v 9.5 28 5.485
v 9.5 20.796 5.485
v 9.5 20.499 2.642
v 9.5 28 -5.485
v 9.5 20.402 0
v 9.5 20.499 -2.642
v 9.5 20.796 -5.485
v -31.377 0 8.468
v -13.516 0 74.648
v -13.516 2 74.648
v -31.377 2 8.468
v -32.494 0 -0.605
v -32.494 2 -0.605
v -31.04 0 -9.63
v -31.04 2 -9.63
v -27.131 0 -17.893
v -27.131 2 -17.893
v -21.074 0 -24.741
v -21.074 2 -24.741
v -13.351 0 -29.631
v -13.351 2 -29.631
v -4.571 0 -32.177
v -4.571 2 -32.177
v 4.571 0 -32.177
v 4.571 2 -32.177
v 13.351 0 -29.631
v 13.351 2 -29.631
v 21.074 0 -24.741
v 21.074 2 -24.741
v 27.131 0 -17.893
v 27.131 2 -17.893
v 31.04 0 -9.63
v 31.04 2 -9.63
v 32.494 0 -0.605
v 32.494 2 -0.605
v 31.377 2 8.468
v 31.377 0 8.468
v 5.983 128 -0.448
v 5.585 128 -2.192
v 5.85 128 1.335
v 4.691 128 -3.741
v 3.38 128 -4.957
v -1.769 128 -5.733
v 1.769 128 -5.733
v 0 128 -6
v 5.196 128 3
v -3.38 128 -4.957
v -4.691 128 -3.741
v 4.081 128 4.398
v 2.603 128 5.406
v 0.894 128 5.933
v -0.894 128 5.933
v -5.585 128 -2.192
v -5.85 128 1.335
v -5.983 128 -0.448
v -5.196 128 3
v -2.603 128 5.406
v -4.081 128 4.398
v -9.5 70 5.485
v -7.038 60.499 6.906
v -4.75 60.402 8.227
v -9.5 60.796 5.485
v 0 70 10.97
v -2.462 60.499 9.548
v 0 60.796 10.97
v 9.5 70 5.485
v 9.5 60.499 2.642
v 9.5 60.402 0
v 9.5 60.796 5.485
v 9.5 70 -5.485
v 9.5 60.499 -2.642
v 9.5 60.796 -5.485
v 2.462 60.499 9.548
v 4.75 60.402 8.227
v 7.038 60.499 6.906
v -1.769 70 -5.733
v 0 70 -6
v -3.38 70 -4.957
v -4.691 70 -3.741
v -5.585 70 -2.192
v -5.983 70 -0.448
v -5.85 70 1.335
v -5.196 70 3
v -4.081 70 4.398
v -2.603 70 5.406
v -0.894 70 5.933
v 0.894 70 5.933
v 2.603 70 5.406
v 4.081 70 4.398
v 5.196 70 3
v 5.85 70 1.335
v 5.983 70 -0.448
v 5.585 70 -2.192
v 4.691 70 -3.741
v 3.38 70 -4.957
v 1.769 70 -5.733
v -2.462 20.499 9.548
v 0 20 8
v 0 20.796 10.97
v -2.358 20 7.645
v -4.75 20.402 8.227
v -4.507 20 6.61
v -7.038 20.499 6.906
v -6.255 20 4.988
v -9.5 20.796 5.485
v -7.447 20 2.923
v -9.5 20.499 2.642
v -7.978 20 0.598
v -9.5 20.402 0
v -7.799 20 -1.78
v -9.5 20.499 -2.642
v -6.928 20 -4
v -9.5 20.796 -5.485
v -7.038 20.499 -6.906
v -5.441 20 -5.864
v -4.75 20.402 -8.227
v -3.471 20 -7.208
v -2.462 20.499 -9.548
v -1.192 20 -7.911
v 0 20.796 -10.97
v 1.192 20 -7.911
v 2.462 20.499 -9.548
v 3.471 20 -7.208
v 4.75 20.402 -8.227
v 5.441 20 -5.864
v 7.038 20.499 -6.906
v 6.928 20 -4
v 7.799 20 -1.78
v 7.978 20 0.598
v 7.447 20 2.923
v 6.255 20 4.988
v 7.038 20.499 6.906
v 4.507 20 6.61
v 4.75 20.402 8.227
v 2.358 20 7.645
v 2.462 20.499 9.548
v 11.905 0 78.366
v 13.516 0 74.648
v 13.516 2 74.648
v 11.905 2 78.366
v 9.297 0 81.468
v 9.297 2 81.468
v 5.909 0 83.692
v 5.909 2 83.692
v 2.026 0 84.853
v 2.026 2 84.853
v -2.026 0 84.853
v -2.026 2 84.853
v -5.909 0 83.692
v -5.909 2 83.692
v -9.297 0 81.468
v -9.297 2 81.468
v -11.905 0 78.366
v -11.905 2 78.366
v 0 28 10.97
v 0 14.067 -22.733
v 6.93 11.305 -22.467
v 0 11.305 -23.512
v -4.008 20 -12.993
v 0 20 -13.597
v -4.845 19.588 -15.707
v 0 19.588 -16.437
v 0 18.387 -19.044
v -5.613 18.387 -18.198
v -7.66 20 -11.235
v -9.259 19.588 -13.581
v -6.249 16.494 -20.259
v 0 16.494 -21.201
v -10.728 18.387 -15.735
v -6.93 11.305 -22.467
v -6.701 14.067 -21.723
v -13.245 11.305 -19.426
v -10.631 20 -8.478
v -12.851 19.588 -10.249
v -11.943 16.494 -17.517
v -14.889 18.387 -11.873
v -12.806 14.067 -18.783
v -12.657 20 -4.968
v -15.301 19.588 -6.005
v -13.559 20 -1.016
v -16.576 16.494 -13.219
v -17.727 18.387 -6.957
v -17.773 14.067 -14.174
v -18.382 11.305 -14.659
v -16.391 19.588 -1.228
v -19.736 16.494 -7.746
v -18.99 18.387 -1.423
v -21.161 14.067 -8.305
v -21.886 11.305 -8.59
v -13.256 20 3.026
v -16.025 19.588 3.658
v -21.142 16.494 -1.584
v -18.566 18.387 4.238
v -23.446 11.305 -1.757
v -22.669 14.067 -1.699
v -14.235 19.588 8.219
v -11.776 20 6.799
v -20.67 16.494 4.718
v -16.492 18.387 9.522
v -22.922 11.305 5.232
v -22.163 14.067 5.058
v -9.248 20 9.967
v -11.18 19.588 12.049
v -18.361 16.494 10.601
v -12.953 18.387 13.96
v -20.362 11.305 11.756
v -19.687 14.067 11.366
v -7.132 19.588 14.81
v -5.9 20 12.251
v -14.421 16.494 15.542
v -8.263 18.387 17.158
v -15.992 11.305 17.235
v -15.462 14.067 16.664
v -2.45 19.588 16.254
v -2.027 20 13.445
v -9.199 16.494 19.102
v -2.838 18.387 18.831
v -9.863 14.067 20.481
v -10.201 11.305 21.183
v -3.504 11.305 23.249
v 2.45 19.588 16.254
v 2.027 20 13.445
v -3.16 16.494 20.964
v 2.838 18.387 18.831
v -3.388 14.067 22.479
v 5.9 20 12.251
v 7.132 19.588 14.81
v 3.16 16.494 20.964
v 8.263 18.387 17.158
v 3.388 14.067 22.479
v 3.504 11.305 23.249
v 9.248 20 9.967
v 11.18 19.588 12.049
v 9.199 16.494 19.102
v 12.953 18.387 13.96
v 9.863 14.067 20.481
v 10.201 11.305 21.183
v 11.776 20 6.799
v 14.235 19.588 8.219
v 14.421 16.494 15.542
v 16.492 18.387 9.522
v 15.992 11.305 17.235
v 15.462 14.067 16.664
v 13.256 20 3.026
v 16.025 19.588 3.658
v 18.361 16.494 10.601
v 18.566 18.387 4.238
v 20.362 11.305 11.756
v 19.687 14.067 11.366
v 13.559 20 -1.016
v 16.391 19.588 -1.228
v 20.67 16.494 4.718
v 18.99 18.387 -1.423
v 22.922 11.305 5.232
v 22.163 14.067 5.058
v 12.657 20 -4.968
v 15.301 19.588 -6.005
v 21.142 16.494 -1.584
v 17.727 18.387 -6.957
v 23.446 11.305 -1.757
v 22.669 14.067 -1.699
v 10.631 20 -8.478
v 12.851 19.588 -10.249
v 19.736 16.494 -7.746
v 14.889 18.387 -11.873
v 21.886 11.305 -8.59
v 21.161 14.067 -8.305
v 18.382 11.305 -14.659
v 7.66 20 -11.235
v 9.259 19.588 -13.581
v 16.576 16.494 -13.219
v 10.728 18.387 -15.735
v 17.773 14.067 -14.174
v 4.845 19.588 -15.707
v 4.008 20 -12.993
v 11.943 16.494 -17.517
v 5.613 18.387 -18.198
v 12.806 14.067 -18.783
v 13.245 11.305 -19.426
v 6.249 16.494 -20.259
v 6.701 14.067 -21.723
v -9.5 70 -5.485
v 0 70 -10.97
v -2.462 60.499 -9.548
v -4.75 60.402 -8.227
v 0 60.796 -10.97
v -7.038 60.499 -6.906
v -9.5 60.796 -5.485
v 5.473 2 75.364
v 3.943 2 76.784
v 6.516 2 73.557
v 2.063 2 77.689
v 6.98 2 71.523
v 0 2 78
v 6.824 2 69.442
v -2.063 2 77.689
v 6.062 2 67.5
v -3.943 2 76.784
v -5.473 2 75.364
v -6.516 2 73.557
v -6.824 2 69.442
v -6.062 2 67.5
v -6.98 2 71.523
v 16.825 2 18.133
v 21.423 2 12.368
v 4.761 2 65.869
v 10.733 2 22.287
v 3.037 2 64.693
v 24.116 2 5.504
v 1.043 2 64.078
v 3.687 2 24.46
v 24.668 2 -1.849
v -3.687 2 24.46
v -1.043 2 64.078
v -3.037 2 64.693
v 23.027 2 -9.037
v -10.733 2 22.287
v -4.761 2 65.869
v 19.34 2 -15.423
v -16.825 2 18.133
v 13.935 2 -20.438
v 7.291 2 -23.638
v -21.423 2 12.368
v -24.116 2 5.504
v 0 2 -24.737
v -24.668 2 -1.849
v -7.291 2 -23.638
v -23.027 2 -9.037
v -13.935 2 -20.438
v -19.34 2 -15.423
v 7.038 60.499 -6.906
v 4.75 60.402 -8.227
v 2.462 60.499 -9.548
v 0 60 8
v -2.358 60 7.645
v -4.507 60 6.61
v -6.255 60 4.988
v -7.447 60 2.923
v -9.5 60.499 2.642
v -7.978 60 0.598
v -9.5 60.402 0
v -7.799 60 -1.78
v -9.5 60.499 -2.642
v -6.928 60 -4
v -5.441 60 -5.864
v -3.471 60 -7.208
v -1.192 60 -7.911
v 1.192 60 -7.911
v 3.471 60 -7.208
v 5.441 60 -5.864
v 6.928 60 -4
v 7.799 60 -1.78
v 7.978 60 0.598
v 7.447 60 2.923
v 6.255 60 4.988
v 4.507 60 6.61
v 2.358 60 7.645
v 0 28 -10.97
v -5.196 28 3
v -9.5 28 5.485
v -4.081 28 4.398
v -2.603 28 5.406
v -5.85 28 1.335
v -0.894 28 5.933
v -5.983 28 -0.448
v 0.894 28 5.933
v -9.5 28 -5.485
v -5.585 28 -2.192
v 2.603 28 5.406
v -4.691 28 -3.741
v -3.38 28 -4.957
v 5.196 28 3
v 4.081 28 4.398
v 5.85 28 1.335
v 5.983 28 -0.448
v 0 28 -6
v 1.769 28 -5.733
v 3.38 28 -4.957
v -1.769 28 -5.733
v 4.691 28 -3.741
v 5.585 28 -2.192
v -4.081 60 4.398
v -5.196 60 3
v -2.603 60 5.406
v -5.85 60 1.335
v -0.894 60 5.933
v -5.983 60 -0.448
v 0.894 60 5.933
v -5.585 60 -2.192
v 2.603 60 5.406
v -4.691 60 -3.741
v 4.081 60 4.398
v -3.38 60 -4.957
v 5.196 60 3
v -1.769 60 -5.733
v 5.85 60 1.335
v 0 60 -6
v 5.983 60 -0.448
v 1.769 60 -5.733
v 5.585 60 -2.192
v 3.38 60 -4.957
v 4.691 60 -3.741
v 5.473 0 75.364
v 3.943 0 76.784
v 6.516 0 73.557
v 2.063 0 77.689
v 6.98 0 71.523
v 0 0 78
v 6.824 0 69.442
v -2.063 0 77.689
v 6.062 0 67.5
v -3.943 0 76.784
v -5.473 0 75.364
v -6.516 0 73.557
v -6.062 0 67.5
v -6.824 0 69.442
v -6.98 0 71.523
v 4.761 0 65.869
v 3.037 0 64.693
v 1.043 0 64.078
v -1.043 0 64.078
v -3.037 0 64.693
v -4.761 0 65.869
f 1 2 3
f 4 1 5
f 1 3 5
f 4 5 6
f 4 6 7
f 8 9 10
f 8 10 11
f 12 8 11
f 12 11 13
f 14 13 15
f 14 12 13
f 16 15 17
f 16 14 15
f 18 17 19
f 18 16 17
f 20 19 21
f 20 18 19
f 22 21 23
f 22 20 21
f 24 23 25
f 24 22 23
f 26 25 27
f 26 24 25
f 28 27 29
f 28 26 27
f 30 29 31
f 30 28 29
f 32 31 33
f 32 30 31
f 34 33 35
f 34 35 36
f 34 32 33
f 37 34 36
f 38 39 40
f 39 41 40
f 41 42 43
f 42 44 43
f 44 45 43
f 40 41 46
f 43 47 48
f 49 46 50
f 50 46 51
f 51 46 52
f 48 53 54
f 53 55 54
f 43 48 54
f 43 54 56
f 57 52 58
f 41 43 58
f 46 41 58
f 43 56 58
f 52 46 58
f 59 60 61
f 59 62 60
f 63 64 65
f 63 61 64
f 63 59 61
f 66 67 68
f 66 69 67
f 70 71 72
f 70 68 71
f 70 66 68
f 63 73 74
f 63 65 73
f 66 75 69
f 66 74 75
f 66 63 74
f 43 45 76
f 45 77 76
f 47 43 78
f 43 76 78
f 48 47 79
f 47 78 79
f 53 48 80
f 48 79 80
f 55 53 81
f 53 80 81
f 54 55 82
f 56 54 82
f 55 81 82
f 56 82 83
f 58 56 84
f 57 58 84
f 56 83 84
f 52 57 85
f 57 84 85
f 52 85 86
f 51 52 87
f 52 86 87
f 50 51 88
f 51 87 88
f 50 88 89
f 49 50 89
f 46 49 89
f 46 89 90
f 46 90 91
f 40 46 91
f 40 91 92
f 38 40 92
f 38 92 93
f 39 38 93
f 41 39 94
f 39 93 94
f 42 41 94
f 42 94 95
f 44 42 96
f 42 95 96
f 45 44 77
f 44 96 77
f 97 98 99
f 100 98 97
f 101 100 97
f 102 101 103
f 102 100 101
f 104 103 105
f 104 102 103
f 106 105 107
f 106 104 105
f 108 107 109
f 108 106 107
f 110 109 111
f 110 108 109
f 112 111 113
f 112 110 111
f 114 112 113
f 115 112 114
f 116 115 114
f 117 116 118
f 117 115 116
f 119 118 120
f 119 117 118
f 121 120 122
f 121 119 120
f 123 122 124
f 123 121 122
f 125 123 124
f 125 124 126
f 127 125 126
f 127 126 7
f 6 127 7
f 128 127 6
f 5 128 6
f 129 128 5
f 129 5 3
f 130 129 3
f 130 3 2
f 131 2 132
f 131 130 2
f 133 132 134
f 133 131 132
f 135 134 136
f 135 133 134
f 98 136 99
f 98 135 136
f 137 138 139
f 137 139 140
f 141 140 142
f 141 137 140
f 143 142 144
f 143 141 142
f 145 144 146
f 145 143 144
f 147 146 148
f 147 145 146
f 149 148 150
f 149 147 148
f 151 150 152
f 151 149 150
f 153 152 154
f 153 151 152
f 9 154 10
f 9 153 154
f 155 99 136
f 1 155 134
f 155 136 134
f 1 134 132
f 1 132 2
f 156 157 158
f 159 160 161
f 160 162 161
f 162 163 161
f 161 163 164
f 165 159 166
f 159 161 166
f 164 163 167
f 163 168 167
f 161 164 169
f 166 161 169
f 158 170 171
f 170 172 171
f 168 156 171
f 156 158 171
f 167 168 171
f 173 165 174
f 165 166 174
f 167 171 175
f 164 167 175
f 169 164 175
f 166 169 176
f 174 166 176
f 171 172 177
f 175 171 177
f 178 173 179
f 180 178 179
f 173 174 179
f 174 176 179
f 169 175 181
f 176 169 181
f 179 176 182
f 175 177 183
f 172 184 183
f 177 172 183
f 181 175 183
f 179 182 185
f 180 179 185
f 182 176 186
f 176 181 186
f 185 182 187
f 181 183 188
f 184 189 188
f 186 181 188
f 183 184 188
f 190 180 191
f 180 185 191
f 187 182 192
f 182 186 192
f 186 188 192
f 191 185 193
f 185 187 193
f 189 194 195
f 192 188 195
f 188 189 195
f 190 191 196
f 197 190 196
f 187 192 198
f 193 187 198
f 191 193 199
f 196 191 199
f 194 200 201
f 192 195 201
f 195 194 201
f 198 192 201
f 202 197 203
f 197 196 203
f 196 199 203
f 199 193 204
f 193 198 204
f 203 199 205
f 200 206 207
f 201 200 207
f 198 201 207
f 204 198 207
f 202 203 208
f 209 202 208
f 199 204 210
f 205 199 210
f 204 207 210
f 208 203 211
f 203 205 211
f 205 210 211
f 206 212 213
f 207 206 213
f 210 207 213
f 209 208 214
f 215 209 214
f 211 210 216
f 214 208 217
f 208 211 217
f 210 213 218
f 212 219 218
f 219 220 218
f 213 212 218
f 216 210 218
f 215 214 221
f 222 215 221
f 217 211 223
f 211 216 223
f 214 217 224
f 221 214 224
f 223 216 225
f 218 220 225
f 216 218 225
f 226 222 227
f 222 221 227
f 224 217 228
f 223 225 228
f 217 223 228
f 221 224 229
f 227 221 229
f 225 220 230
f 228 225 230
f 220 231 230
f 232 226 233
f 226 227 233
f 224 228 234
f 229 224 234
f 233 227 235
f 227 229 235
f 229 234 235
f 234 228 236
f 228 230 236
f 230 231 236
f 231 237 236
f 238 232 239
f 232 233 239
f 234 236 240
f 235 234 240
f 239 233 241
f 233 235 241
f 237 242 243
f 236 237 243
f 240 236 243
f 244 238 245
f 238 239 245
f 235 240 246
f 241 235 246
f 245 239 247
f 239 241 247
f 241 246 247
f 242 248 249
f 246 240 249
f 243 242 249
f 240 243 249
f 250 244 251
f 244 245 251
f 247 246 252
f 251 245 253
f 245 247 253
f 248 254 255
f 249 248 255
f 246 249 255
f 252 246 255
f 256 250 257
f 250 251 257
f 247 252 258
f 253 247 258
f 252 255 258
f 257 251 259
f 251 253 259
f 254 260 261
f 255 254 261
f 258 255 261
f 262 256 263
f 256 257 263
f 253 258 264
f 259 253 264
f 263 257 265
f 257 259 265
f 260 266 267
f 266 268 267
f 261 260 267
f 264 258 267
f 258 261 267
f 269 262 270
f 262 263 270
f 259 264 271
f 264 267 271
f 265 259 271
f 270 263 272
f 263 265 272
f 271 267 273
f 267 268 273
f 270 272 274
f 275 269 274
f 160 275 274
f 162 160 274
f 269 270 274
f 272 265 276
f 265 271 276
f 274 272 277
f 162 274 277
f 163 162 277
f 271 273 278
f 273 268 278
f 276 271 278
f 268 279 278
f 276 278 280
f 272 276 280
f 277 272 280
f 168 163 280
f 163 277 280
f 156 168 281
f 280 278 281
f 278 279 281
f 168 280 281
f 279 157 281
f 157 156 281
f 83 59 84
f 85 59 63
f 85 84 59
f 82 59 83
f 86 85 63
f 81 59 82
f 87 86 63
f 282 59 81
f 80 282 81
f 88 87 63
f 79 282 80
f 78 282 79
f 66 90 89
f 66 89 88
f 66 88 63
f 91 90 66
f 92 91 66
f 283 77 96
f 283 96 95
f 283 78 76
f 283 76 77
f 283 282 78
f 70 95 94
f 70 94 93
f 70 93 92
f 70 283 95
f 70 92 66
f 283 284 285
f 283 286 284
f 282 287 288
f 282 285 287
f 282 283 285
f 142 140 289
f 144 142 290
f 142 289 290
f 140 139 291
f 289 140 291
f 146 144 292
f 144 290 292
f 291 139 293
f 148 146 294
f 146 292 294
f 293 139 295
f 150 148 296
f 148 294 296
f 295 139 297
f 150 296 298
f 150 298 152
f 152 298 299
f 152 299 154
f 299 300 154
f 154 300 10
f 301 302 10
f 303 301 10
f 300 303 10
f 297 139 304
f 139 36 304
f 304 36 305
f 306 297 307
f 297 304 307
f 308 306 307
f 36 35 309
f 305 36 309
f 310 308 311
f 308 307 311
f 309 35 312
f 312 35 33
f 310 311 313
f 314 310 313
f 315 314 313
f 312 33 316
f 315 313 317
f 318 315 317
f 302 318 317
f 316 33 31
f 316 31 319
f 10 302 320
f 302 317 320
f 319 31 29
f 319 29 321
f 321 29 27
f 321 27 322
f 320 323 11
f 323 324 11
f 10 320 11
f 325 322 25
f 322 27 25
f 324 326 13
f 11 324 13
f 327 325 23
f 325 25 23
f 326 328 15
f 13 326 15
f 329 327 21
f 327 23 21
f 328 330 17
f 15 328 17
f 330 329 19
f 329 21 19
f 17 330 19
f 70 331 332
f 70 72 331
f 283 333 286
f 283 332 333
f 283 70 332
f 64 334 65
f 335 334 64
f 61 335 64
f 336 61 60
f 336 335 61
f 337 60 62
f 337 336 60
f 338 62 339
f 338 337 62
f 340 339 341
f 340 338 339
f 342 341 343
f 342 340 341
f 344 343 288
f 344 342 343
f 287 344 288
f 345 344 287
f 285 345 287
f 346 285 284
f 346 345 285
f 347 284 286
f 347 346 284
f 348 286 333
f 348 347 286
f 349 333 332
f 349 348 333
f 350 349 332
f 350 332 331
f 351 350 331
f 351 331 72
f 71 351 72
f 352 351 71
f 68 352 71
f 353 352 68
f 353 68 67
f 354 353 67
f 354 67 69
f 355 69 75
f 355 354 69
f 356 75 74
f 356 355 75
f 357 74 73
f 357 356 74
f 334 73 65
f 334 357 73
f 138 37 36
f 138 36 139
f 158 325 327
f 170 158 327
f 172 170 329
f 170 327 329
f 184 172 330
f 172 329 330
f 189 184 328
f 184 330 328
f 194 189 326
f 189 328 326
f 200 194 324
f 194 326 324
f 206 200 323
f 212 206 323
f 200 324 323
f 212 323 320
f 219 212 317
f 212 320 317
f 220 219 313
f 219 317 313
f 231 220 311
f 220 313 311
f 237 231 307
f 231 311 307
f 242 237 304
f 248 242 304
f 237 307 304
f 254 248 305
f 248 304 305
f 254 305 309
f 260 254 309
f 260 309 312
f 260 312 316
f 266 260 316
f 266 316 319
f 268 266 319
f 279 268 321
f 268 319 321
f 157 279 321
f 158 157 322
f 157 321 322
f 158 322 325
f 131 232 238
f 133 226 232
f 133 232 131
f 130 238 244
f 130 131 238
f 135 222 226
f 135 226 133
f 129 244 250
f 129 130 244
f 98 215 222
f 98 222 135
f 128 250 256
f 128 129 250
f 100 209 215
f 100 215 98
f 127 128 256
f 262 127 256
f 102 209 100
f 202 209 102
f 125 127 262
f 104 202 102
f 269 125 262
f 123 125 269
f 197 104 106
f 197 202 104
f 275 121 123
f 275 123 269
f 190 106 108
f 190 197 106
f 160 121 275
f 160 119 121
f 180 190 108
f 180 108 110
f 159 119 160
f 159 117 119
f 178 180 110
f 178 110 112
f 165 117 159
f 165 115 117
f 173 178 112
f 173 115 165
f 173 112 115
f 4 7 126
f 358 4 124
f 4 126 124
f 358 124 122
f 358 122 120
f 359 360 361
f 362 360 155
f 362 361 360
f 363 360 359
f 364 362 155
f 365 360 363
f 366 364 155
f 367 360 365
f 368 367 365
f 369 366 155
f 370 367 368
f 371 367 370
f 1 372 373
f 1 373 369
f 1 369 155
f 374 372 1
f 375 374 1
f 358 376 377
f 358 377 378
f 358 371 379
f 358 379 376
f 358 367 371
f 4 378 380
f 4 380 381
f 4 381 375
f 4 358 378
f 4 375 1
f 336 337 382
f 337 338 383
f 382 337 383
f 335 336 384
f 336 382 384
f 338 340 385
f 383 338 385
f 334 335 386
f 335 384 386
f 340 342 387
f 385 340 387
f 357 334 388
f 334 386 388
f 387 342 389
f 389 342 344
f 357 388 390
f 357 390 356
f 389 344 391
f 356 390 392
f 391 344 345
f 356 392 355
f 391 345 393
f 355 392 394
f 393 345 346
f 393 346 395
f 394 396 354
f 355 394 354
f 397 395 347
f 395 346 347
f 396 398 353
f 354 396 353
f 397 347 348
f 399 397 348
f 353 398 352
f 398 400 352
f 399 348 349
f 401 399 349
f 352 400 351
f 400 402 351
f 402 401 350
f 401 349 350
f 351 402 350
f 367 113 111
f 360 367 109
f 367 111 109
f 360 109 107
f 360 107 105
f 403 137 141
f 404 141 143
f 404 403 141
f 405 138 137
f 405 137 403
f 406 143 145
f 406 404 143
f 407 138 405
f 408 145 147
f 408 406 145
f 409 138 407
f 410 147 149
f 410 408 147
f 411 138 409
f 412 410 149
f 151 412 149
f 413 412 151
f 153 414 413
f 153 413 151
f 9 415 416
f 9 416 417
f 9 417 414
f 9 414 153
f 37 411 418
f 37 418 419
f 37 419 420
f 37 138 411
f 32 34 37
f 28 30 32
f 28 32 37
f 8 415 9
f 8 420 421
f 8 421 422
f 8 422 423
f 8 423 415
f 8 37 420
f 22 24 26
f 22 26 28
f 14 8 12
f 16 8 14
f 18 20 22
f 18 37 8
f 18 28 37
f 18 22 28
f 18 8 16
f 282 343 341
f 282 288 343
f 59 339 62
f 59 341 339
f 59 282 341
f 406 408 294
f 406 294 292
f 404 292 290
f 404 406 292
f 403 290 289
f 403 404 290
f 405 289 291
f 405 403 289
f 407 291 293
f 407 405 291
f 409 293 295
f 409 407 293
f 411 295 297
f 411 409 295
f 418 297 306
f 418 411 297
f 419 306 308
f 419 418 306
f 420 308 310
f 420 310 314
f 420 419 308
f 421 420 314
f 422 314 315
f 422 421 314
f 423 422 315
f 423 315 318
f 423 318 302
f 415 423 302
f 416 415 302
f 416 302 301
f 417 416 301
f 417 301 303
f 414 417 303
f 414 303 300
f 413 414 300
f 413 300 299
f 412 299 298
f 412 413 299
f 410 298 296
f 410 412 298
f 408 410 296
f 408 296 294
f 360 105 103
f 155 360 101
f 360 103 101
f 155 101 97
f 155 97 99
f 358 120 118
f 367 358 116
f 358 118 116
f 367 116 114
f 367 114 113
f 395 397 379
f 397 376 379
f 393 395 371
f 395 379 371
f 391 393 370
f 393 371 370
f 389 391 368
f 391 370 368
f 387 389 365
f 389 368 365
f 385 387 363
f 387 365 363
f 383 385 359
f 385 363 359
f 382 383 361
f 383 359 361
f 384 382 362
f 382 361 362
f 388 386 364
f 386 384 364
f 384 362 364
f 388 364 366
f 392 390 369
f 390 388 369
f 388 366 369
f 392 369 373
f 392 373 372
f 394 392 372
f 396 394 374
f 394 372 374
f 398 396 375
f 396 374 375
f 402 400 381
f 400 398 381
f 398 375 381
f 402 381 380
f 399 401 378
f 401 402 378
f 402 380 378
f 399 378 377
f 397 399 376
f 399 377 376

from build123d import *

# Parameters (mm, degrees)
SKETCH2_R           = 7
BOSS_EXTRUDE1_DEPTH = 2
BOSS_EXTRUDE2_DEPTH = 8
BOSS_EXTRUDE3_DEPTH = 10


with BuildPart() as part:
    # Sketch1 → Revolve1 (revolve)
    with BuildSketch(Plane.XY, mode=Mode.PRIVATE) as revolve1_sk:
        with BuildLine():
            Line((0, 0), (0, 128))
            Line((0, 128), (6, 128))
            Line((6, 128), (6, 20))
            Line((6, 20), (13.597185418, 20))
            ThreePointArc((13.597185418, 20), (20.190643569, 17.518398075), (23.511634032, 11.305261922))
            Line((23.511634032, 11.305261922), (25, 0))
            Line((25, 0), (0, 0))
        make_face()
    revolve(revolve1_sk.sketch.rotate(Axis((0, 0, 0), (0, 1, 0)), 90), axis=Axis((0, 0, 0), (0, 1, 0)))

    # Sketch2 → Boss-Extrude1 (add)
    with BuildSketch(Plane(origin=(0, 0, 0), x_dir=(1, 0, 0), z_dir=(0, 1, 0))):
        with BuildLine():
            Line((-13.516394418, -74.647887324), (-31.377344185, -8.468309859))
            ThreePointArc((-31.377344185, -8.468309859), (0, 32.5), (31.377344185, -8.468309859))
            Line((31.377344185, -8.468309859), (13.516394418, -74.647887324))
            ThreePointArc((13.516394418, -74.647887324), (0, -85), (-13.516394418, -74.647887324))
        make_face()
        with Locations(Location((0, -71, 0), (0, 0, 270))):
            Circle(SKETCH2_R, mode=Mode.SUBTRACT)
    extrude(amount=BOSS_EXTRUDE1_DEPTH)

    # Sketch3 → Boss-Extrude2 (add)
    with BuildSketch(Plane(origin=(0, 20, 0), x_dir=(1, 0, 0), z_dir=(0, 1, 0))):
        Polygon((0, -10.969655115), (9.5, -5.484827557), (9.5, 5.484827557), (0, 10.969655115), (-9.5, 5.484827557), (-9.5, -5.484827557), align=None)
    extrude(amount=BOSS_EXTRUDE2_DEPTH)

    # Sketch5 → Boss-Extrude3 (add)
    with BuildSketch(Plane(origin=(0, 70, 0), x_dir=(1, 0, 0), z_dir=(0, 1, 0))):
        Polygon((0, 10.969655115), (-9.5, 5.484827557), (-9.5, -5.484827557), (0, -10.969655115), (9.5, -5.484827557), (9.5, 5.484827557), align=None)
    extrude(amount=-BOSS_EXTRUDE3_DEPTH)

    # Sketch4 → Cut-Revolve1 (revolve, cut)
    with BuildSketch(Plane(origin=(0, 0, 0), x_dir=(0, 0, -1), z_dir=(1, 0, 0)), mode=Mode.PRIVATE) as cut_revolve1_sk:
        Polygon((8, 20), (10.969655115, 20), (10.969655115, 20.79571669), align=None)
        Polygon((8, 60), (10.969655115, 60), (10.969655115, 60.79571669), align=None)
    revolve(cut_revolve1_sk.sketch.rotate(Axis((0, 60, 0), (0, -1, 0)), 180), axis=Axis((0, 60, 0), (0, -1, 0)), mode=Mode.SUBTRACT)


solid = part.part
